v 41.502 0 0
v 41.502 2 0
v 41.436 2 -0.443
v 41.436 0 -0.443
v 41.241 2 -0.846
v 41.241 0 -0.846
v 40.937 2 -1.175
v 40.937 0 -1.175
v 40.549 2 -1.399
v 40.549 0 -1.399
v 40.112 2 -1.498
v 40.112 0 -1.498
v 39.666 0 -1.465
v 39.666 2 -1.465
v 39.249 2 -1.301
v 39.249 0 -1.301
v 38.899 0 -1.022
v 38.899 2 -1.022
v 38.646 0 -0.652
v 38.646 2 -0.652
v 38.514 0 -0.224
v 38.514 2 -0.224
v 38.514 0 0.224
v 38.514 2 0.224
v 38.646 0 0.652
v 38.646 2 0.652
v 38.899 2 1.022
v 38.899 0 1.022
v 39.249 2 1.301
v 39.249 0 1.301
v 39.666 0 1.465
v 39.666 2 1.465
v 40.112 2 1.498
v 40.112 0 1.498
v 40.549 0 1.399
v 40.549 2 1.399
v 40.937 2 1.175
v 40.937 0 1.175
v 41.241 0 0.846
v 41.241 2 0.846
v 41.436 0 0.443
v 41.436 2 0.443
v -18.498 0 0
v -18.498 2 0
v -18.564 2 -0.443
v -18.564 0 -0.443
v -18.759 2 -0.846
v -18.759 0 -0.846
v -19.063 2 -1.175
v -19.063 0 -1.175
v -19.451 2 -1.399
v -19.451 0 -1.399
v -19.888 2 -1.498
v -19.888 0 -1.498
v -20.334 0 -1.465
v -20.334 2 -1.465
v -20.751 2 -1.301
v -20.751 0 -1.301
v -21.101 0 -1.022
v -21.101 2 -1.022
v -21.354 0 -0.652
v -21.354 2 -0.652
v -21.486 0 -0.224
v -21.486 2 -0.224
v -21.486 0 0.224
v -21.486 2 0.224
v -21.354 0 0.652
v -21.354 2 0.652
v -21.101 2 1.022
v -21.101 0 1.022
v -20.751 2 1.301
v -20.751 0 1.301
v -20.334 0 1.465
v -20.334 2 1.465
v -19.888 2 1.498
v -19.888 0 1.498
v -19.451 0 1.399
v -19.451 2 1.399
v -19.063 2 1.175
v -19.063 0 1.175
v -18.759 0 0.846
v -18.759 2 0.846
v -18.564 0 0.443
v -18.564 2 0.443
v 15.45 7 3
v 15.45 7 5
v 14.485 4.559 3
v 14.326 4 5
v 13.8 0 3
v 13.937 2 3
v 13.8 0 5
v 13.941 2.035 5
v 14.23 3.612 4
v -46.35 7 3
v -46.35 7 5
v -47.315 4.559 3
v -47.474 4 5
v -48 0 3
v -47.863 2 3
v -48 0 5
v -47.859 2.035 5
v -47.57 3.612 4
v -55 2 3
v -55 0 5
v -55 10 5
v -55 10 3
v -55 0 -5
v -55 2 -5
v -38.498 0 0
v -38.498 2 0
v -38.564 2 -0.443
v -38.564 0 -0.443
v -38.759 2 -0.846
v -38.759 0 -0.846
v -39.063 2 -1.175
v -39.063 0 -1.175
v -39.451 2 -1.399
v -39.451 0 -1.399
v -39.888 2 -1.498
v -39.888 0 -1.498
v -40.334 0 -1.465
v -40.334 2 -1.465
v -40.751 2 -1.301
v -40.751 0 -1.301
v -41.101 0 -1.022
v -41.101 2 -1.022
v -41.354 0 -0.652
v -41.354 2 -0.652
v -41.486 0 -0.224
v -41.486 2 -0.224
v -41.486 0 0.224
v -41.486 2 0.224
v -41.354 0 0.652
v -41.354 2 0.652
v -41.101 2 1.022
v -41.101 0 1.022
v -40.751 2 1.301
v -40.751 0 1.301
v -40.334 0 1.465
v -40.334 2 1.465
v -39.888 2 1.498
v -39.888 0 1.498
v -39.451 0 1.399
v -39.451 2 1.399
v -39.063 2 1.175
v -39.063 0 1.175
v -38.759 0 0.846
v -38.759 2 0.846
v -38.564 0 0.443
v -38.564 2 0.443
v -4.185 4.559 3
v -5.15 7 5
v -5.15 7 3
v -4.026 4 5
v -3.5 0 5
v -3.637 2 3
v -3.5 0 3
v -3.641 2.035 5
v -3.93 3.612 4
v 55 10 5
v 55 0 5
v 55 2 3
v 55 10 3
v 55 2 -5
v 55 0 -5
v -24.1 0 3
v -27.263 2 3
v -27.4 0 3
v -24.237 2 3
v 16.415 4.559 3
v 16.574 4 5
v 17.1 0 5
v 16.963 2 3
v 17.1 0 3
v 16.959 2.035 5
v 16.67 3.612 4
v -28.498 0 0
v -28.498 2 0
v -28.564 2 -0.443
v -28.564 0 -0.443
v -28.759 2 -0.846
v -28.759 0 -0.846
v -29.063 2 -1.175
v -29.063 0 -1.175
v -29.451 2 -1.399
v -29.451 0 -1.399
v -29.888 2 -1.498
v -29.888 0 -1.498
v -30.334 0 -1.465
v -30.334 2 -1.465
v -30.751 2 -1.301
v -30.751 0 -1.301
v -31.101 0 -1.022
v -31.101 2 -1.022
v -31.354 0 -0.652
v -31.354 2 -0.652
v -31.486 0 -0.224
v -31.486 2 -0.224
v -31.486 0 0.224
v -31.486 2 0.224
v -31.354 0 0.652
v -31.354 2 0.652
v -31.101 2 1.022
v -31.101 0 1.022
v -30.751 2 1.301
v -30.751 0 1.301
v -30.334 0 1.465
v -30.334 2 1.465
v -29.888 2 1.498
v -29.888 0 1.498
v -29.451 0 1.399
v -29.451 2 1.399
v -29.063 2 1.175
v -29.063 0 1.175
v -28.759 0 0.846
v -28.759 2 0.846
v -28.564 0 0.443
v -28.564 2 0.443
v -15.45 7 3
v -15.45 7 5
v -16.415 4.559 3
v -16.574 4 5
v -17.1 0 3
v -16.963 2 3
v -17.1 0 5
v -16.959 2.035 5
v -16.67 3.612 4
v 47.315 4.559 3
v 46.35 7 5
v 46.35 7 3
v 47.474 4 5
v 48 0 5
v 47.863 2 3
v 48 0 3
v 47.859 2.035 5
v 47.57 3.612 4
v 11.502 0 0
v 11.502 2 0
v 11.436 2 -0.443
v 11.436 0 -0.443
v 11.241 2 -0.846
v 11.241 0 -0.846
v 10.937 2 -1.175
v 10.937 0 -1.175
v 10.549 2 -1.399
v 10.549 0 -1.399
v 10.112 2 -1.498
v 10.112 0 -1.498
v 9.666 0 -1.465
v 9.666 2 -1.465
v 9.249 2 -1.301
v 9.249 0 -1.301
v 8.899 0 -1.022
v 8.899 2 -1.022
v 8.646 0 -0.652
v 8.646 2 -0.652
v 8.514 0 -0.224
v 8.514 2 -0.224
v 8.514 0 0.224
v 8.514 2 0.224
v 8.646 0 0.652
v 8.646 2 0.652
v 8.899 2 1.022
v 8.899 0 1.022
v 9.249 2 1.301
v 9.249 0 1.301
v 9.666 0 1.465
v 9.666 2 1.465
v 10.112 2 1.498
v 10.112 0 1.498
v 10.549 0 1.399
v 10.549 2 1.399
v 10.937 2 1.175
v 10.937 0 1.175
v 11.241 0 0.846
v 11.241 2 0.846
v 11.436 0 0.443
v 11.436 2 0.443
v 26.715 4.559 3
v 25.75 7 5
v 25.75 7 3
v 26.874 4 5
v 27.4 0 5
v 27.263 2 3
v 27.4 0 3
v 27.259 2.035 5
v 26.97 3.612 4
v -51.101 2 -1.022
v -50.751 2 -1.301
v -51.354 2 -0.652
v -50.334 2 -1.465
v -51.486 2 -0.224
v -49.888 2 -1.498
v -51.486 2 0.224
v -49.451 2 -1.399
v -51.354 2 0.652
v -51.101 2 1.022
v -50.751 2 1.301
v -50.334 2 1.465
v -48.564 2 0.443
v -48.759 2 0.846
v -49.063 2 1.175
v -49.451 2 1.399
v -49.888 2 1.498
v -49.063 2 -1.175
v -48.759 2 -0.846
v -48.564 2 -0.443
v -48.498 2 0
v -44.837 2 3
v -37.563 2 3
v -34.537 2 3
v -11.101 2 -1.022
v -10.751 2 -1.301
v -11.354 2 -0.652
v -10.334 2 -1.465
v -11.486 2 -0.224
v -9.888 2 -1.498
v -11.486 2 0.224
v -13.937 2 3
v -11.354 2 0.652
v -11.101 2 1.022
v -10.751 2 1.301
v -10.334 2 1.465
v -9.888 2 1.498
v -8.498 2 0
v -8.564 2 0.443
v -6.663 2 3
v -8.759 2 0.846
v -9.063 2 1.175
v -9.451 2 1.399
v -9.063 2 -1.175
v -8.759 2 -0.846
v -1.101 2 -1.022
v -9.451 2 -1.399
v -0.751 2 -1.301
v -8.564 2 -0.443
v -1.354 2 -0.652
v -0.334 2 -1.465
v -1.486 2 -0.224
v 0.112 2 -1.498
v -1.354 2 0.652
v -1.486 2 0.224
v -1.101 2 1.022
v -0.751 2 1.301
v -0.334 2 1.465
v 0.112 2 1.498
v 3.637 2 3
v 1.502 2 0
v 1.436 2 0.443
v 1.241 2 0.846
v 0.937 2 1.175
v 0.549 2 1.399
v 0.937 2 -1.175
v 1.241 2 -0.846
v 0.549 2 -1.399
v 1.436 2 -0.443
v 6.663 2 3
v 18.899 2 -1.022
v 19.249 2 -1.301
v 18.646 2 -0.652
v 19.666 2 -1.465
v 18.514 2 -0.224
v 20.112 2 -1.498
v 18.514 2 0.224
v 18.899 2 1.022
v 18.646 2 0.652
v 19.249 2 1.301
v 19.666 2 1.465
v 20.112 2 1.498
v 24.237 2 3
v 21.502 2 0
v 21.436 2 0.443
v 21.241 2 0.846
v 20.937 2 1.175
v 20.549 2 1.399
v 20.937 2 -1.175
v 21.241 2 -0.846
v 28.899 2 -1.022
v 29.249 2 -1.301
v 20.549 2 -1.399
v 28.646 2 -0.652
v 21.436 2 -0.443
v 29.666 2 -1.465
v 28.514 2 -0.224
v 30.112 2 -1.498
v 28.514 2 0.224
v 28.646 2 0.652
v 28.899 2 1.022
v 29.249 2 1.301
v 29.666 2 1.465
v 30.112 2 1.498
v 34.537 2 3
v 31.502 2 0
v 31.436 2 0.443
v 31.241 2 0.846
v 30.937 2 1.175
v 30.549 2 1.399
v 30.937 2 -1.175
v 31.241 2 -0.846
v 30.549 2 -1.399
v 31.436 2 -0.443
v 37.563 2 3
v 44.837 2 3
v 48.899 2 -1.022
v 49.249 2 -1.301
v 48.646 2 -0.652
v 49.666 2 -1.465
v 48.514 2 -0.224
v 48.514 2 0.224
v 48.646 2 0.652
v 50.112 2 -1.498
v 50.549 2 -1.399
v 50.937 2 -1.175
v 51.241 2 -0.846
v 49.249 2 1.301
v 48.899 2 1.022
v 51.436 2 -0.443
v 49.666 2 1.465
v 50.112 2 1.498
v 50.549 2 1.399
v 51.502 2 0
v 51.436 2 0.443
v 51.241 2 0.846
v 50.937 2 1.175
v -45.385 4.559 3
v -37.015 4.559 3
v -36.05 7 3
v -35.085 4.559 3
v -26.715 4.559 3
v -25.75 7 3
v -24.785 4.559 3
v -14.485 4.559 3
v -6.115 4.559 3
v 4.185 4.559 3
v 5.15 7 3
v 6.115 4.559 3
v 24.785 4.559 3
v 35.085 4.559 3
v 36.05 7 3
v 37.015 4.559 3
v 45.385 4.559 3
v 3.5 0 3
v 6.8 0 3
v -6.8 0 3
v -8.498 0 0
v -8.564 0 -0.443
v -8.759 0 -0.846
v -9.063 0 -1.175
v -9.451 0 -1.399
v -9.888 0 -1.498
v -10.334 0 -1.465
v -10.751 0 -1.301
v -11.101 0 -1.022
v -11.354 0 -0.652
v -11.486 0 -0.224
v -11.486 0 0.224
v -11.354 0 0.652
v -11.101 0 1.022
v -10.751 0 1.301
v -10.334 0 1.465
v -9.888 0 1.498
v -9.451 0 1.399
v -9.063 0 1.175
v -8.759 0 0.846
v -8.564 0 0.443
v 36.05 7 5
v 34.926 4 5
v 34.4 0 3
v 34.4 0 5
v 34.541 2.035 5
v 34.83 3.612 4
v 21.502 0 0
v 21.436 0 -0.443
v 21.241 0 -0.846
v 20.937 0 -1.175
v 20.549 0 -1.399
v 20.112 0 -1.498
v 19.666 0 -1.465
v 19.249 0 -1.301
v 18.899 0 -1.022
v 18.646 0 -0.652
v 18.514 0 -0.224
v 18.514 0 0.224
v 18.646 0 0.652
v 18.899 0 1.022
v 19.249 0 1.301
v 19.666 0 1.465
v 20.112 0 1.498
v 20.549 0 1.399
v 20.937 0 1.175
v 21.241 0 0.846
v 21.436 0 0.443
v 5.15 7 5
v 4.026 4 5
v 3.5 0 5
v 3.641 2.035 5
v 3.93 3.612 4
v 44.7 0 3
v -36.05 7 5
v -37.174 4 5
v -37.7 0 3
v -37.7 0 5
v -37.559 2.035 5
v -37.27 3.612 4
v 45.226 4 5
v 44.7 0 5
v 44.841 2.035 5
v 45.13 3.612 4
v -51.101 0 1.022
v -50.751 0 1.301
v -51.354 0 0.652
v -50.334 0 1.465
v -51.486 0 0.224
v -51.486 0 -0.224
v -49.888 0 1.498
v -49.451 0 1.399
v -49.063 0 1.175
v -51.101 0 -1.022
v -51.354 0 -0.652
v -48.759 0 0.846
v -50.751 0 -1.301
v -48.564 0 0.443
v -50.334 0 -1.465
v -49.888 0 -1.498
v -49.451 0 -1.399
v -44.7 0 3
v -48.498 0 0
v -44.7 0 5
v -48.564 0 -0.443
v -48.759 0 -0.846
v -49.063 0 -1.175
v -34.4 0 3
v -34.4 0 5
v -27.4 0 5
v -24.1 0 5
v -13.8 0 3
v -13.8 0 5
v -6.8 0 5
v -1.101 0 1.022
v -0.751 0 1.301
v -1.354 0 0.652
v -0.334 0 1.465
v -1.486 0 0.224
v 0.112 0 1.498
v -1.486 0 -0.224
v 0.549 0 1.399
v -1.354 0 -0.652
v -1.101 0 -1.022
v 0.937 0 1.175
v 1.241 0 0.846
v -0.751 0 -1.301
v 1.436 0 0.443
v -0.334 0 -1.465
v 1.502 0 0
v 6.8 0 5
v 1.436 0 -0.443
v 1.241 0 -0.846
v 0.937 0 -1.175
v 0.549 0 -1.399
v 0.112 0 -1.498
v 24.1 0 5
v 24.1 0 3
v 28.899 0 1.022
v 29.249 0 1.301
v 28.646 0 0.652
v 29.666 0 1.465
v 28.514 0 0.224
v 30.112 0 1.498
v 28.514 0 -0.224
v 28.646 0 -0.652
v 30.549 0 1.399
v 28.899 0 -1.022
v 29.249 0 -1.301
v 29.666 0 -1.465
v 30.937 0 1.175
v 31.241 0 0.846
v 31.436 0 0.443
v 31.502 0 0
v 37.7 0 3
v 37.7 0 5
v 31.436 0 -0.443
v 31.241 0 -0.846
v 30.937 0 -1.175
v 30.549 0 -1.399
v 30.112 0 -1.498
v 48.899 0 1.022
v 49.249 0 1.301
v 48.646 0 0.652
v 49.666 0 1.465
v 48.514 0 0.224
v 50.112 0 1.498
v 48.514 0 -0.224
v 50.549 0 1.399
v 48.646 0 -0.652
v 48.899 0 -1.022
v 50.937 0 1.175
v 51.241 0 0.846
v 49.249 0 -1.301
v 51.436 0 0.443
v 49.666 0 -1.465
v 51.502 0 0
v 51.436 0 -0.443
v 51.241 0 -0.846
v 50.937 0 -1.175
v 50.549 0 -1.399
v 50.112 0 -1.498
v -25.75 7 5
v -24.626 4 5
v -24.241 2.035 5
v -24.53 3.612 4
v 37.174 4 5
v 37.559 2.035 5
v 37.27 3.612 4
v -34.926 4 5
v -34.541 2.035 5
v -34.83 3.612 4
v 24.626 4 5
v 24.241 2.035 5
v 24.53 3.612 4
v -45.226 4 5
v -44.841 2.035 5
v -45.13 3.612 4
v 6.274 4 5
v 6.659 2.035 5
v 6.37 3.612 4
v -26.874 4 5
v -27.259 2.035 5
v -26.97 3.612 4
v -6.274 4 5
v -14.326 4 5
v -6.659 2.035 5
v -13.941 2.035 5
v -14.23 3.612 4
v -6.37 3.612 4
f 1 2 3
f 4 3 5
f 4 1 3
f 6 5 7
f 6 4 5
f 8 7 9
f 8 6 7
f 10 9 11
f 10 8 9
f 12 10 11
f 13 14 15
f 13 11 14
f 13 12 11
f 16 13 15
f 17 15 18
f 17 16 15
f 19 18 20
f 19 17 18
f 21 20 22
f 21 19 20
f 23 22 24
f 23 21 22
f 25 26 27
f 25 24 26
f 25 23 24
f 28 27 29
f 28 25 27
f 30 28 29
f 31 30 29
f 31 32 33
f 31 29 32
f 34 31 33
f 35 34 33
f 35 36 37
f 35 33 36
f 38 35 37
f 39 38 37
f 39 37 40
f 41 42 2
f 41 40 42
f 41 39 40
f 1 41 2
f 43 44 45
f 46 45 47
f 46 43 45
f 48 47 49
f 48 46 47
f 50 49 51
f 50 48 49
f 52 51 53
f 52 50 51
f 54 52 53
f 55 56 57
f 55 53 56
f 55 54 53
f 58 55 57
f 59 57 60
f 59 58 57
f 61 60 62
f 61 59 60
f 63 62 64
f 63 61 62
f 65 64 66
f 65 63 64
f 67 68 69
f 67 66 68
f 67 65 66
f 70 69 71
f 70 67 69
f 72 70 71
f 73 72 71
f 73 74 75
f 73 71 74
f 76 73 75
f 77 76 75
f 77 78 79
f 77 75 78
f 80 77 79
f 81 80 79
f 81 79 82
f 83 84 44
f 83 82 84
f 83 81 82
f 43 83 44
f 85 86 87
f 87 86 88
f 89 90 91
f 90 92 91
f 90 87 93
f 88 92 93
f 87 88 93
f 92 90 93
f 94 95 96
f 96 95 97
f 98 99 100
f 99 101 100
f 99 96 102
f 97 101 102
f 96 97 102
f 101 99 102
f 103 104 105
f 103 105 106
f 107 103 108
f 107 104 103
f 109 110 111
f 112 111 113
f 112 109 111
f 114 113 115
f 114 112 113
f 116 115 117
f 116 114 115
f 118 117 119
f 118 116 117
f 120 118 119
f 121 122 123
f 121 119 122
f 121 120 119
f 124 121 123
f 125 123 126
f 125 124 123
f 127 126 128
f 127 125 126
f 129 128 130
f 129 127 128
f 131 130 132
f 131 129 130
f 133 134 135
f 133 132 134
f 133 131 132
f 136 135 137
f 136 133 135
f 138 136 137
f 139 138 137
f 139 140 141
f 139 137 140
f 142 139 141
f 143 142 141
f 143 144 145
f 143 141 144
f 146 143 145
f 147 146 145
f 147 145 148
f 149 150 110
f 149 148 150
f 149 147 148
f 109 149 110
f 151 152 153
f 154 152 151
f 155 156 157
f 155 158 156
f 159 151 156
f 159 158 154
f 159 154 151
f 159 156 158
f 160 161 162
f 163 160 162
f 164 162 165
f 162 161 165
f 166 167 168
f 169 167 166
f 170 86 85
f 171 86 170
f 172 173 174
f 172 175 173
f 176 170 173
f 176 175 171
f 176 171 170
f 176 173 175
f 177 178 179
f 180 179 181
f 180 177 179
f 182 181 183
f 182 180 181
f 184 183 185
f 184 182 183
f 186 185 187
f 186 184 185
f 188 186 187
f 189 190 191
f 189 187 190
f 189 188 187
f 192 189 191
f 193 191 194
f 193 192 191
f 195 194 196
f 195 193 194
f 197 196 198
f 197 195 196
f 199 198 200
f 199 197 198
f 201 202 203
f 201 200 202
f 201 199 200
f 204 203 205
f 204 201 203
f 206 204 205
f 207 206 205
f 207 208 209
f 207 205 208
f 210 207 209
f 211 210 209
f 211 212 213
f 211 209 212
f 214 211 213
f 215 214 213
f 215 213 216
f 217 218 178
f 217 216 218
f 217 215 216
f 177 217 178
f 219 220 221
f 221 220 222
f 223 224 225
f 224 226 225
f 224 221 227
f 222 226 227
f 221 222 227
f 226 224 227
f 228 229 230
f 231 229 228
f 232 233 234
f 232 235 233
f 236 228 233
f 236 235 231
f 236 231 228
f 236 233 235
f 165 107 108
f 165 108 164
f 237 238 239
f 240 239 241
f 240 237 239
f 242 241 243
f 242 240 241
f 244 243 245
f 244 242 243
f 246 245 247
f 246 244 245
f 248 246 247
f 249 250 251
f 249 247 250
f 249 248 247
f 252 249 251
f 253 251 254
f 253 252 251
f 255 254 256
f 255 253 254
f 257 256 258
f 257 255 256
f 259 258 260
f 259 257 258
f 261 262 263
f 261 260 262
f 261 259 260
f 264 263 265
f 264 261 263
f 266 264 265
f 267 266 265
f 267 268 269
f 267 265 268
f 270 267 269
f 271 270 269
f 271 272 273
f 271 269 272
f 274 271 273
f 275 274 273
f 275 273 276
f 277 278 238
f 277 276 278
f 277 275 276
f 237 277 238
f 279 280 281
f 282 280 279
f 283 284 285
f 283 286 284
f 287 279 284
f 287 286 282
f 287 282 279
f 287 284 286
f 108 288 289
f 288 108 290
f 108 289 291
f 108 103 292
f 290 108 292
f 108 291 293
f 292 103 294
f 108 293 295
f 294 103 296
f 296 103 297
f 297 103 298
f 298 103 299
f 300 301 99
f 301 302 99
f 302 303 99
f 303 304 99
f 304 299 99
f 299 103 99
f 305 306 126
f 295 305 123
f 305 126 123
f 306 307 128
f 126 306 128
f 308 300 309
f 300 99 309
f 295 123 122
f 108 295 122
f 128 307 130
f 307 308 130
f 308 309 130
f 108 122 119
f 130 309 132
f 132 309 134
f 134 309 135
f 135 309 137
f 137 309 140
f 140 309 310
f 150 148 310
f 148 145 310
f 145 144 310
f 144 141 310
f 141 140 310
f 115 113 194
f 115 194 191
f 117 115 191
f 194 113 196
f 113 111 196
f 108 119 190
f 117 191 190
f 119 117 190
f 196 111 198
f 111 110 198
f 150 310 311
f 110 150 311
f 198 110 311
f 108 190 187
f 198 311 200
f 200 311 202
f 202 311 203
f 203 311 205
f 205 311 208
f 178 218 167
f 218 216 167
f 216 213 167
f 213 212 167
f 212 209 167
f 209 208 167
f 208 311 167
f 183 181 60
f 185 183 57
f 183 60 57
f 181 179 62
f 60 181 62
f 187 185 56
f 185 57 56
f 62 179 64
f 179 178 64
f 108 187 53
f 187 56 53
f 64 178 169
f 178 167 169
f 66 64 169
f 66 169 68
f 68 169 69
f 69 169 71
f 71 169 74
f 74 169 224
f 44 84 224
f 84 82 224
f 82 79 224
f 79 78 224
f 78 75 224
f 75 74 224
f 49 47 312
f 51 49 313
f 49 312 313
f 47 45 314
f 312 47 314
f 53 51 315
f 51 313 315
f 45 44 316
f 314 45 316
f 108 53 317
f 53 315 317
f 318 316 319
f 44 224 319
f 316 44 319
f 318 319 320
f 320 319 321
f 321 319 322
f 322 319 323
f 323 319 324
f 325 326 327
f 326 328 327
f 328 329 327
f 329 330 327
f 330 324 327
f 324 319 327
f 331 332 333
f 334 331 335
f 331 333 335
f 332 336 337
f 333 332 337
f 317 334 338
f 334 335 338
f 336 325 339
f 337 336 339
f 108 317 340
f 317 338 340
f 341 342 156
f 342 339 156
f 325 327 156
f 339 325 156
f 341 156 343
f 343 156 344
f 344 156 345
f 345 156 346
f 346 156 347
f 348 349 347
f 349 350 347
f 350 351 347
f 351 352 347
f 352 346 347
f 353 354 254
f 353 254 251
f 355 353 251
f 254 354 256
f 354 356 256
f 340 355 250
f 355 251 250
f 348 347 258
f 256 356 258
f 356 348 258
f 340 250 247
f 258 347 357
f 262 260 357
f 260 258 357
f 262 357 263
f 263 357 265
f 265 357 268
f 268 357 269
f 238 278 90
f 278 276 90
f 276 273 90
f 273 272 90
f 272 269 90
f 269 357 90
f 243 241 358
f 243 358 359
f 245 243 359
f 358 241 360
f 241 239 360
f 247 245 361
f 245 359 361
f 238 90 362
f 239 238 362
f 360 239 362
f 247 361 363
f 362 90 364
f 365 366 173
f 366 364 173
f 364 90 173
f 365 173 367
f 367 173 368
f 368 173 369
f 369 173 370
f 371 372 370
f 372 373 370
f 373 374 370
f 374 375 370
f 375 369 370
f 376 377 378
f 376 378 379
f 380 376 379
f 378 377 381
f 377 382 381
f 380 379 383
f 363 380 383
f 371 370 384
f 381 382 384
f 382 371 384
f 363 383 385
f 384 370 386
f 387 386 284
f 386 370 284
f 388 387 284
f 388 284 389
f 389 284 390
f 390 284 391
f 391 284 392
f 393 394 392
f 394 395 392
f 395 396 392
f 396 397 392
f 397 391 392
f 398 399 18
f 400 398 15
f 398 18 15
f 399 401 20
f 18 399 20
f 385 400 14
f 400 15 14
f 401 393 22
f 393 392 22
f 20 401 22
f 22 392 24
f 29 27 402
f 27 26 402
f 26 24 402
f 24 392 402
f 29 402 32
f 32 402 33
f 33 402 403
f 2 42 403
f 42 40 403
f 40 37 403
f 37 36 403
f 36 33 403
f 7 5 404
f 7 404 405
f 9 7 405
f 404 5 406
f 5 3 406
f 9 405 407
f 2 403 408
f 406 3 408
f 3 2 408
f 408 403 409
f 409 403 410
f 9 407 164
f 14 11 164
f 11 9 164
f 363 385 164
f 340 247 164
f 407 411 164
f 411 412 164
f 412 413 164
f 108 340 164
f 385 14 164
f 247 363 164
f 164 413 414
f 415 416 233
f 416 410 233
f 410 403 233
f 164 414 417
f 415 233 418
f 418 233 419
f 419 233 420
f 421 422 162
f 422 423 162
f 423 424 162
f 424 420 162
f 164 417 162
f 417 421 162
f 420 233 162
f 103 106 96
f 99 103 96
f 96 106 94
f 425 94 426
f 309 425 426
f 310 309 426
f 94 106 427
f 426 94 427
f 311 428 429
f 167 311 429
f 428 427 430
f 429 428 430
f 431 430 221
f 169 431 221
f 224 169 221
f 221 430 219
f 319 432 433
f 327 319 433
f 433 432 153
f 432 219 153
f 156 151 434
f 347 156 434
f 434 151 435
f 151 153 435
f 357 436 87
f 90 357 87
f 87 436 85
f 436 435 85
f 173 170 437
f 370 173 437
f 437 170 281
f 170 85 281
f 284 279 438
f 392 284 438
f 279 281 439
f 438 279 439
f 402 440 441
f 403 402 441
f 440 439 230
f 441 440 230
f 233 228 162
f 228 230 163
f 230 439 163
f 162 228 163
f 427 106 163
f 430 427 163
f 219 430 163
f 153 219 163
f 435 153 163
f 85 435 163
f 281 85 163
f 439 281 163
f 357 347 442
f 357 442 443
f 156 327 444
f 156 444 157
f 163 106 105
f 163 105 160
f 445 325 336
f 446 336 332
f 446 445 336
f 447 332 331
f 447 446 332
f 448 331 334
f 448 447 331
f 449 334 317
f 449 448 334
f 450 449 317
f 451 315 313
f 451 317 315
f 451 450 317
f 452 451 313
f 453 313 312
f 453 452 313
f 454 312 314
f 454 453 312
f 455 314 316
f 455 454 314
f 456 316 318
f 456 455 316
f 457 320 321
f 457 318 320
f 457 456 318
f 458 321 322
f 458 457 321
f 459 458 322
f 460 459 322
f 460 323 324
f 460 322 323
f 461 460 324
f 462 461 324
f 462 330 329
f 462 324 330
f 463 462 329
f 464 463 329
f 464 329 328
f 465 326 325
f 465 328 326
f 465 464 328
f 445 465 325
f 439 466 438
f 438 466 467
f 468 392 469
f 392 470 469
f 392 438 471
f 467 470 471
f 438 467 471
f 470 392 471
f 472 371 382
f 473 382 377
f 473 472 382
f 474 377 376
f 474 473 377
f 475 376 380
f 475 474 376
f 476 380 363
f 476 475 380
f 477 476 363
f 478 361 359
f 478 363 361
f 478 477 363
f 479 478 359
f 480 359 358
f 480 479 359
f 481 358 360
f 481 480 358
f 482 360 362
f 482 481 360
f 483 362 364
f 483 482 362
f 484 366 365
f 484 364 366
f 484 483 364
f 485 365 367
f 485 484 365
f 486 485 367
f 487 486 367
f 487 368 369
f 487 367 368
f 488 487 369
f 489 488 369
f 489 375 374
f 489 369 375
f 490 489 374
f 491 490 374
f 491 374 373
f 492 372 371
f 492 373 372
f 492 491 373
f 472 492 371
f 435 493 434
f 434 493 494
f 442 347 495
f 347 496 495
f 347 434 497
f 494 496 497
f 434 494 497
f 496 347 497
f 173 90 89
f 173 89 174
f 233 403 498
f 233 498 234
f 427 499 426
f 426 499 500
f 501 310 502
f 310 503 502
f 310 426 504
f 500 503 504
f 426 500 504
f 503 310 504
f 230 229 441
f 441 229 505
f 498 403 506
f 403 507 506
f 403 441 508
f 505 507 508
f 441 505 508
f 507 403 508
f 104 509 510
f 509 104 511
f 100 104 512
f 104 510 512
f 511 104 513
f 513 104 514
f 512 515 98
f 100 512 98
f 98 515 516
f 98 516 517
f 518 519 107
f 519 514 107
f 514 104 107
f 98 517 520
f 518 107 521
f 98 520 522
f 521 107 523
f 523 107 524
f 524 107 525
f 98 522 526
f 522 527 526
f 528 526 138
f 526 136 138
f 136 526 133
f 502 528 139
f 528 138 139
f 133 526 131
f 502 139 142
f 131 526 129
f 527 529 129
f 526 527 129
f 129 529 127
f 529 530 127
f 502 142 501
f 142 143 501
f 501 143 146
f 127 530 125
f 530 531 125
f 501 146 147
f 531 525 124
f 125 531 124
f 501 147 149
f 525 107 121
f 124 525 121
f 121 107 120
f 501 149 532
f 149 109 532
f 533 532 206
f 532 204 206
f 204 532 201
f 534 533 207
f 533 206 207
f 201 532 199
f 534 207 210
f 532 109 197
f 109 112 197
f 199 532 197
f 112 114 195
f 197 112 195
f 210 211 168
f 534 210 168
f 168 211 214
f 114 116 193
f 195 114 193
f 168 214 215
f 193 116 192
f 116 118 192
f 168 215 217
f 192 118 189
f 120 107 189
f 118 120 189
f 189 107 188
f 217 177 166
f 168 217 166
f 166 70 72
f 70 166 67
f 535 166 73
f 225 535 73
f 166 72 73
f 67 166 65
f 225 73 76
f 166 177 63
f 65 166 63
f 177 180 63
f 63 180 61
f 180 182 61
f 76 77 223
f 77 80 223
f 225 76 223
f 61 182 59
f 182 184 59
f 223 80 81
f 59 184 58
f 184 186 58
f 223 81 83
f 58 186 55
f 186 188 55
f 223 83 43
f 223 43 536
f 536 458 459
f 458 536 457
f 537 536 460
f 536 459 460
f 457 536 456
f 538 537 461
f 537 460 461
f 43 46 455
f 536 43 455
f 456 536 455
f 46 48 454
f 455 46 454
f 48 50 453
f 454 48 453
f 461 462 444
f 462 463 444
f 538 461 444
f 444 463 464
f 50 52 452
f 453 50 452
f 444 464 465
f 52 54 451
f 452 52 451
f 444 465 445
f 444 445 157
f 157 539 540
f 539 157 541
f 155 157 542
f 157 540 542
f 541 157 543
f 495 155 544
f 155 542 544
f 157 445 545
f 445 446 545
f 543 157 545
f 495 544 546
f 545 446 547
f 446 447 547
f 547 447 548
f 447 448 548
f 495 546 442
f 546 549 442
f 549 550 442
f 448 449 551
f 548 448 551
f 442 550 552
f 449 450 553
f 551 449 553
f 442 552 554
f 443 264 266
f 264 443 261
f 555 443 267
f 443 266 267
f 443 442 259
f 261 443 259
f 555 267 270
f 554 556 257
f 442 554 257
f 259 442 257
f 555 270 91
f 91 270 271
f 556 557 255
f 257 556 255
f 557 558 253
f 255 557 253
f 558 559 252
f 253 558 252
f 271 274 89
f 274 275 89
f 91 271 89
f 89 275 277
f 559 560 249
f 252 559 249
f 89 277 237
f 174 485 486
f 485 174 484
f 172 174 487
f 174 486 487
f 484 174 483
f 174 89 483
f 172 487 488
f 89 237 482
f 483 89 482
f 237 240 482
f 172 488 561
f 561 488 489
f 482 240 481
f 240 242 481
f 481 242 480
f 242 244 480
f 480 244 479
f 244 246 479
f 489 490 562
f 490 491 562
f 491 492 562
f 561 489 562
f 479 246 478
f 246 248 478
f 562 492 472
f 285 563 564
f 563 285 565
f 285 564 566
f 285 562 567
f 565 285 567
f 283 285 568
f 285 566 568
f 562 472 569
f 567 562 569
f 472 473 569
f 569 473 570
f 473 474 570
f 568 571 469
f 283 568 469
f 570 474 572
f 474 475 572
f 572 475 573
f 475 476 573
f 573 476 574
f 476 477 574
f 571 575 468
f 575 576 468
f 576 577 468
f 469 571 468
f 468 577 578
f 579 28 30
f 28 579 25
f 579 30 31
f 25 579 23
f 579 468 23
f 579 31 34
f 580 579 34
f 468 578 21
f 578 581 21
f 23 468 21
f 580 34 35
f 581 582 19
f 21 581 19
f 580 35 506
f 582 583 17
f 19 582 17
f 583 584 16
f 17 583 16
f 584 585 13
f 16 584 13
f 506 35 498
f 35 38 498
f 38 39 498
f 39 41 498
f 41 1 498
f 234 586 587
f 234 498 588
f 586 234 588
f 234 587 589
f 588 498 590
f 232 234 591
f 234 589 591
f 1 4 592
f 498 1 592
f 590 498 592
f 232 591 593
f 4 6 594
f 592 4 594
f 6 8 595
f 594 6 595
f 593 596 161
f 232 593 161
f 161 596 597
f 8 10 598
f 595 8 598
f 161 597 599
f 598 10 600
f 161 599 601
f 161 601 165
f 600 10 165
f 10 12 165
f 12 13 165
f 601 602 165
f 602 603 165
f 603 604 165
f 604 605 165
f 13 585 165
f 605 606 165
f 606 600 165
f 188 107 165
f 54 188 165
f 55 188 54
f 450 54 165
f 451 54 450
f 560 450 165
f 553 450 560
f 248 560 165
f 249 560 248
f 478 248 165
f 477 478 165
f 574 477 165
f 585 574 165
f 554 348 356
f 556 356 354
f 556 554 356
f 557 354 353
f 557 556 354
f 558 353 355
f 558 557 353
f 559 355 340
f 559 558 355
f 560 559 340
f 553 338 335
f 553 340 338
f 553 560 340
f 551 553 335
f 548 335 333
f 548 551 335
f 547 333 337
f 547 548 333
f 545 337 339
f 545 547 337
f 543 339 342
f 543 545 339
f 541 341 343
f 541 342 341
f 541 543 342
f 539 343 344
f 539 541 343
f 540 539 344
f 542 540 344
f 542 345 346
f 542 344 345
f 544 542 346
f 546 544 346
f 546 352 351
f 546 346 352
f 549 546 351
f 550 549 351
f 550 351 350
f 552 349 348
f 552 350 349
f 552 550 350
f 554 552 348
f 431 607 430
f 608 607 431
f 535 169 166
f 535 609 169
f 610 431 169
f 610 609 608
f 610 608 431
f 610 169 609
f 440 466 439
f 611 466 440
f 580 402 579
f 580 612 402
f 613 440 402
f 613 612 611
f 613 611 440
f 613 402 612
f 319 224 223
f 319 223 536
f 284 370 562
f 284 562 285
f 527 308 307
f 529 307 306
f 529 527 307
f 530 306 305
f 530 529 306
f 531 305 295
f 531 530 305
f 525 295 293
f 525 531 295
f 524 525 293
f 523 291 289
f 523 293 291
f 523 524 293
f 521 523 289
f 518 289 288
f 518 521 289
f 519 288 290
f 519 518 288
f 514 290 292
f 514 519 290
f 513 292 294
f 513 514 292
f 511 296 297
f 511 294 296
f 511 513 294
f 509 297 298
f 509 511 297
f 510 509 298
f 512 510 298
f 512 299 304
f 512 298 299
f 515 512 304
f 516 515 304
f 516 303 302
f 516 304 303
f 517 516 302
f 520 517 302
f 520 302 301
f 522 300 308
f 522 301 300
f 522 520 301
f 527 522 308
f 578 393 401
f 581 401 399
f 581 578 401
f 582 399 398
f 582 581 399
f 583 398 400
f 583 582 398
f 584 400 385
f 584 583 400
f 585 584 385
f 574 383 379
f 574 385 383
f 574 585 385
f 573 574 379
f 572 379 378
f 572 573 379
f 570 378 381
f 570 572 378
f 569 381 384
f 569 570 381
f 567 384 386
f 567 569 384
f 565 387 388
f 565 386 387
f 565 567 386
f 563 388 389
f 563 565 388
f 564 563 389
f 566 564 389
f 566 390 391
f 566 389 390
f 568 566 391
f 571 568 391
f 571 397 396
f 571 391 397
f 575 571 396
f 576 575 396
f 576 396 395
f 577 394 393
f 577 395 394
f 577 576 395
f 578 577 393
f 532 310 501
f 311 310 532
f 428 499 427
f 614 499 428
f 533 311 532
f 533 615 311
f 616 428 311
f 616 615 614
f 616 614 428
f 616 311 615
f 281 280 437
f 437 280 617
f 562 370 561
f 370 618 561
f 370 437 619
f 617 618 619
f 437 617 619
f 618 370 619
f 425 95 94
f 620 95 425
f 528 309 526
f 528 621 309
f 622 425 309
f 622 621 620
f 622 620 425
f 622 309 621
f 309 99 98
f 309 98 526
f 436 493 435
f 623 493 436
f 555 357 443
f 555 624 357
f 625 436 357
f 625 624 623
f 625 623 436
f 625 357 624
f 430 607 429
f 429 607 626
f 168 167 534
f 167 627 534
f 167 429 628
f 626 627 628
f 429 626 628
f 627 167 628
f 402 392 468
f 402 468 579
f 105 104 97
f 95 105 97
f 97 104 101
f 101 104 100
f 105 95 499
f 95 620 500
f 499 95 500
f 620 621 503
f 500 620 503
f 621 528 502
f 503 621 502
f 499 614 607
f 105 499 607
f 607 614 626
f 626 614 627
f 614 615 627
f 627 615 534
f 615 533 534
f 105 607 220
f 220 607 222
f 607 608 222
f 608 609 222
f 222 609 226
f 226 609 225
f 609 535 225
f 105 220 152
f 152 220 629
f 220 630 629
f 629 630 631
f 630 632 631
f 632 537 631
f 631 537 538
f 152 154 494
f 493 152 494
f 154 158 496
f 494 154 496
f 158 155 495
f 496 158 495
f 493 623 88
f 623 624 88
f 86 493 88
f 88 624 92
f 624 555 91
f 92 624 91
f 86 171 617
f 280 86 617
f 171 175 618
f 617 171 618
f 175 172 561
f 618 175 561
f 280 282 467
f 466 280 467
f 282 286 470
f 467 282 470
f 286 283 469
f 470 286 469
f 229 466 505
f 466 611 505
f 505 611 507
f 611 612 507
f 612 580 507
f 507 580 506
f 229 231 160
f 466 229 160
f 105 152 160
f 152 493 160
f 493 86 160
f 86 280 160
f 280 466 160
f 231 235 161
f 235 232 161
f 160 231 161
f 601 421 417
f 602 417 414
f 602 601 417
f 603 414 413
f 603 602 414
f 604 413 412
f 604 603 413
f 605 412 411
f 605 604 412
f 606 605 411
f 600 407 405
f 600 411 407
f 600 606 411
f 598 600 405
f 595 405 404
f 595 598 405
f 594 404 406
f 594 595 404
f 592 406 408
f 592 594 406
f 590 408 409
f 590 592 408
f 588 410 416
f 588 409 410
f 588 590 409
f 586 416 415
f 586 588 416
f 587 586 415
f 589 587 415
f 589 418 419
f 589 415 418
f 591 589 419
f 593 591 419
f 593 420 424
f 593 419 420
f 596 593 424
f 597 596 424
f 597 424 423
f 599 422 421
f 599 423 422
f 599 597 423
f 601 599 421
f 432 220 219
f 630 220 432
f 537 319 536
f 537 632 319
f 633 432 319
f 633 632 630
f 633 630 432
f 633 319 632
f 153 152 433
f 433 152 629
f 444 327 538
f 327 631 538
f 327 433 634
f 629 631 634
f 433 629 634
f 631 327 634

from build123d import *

# Parameters (mm, degrees)
SKETCH1_W                      = 110
SKETCH1_H                      = 10
SKETCH1_R                      = 1.5025
BOSS_EXTRUDE1_DEPTH            = 10
CUT_EXTRUDE1_REACH             = 7
SKETCH2_W                      = 110
SKETCH2_H                      = 8
CUT_EXTRUDE1_DIRECTION_2_DEPTH = 3
CUT_EXTRUDE2_DEPTH             = 2


with BuildPart() as part:
    # Sketch1 → Boss-Extrude1 (new body)
    with BuildSketch(Plane(origin=(0, 0, 0), x_dir=(1, 0, 0), z_dir=(0, 1, 0))):
        Rectangle(SKETCH1_W, SKETCH1_H)
        with Locations((-50, 0)):
            Circle(SKETCH1_R, mode=Mode.SUBTRACT)
        with Locations((-40, 0)):
            Circle(SKETCH1_R, mode=Mode.SUBTRACT)
        with Locations((-30, 0)):
            Circle(SKETCH1_R, mode=Mode.SUBTRACT)
        with Locations((-20, 0)):
            Circle(SKETCH1_R, mode=Mode.SUBTRACT)
        with Locations((-10, 0)):
            Circle(SKETCH1_R, mode=Mode.SUBTRACT)
        Circle(SKETCH1_R, mode=Mode.SUBTRACT)
        with Locations((10, 0)):
            Circle(SKETCH1_R, mode=Mode.SUBTRACT)
        with Locations((20, 0)):
            Circle(SKETCH1_R, mode=Mode.SUBTRACT)
        with Locations((30, 0)):
            Circle(SKETCH1_R, mode=Mode.SUBTRACT)
        with Locations((40, 0)):
            Circle(SKETCH1_R, mode=Mode.SUBTRACT)
        with Locations((50, 0)):
            Circle(SKETCH1_R, mode=Mode.SUBTRACT)
    extrude(amount=BOSS_EXTRUDE1_DEPTH)

    # Sketch2 → Cut-Extrude1 (cut, up to next)
    with BuildSketch(Plane.XY, mode=Mode.PRIVATE) as cut_extrude1_sk1:
        with Locations((0, 6)):
            Rectangle(SKETCH2_W, SKETCH2_H)
    cut_extrude1_tool1 = extrude(cut_extrude1_sk1.sketch, amount=-CUT_EXTRUDE1_REACH, mode=Mode.PRIVATE) & part.part
    add(cut_extrude1_tool1.solids().sort_by_distance((0, 6, 0))[0], mode=Mode.SUBTRACT)

    # Sketch2 → Cut-Extrude1 direction 2 (cut)
    with BuildSketch(Plane.XY):
        with Locations((0, 6)):
            Rectangle(SKETCH2_W, SKETCH2_H)
    extrude(amount=CUT_EXTRUDE1_DIRECTION_2_DEPTH, mode=Mode.SUBTRACT)

    # Sketch3 → Cut-Extrude2 (cut)
    with BuildSketch(Plane.XY.offset(5)):
        with BuildLine():
            Line((-37.7, 0), (-34.4, 0))
            add(Edge.make_bspline(
                [(-36.05, 7), (-34.434888234, 3.724961413), (-34.4, 0)],
                knots=[0, 0, 0, 1, 1, 1], degree=2))
            add(Edge.make_bspline(
                [(-36.05, 7), (-37.665111766, 3.724961413), (-37.7, 0)],
                knots=[0, 0, 0, 1, 1, 1], degree=2))
        make_face()
        with BuildLine():
            Line((-48, 0), (-44.7, 0))
            add(Edge.make_bspline(
                [(-46.35, 7), (-44.734888234, 3.724961413), (-44.7, 0)],
                knots=[0, 0, 0, 1, 1, 1], degree=2))
            add(Edge.make_bspline(
                [(-46.35, 7), (-47.965111766, 3.724961413), (-48, 0)],
                knots=[0, 0, 0, 1, 1, 1], degree=2))
        make_face()
        with BuildLine():
            Line((-27.4, 0), (-24.1, 0))
            add(Edge.make_bspline(
                [(-25.75, 7), (-24.134888234, 3.724961413), (-24.1, 0)],
                knots=[0, 0, 0, 1, 1, 1], degree=2))
            add(Edge.make_bspline(
                [(-25.75, 7), (-27.365111766, 3.724961413), (-27.4, 0)],
                knots=[0, 0, 0, 1, 1, 1], degree=2))
        make_face()
        with BuildLine():
            Line((-17.1, 0), (-13.8, 0))
            add(Edge.make_bspline(
                [(-15.45, 7), (-13.834888234, 3.724961413), (-13.8, 0)],
                knots=[0, 0, 0, 1, 1, 1], degree=2))
            add(Edge.make_bspline(
                [(-15.45, 7), (-17.065111766, 3.724961413), (-17.1, 0)],
                knots=[0, 0, 0, 1, 1, 1], degree=2))
        make_face()
        with BuildLine():
            Line((-6.8, 0), (-3.5, 0))
            add(Edge.make_bspline(
                [(-5.15, 7), (-3.534888234, 3.724961413), (-3.5, 0)],
                knots=[0, 0, 0, 1, 1, 1], degree=2))
            add(Edge.make_bspline(
                [(-5.15, 7), (-6.765111766, 3.724961413), (-6.8, 0)],
                knots=[0, 0, 0, 1, 1, 1], degree=2))
        make_face()
        with BuildLine():
            Line((3.5, 0), (6.8, 0))
            add(Edge.make_bspline(
                [(5.15, 7), (6.765111766, 3.724961413), (6.8, 0)],
                knots=[0, 0, 0, 1, 1, 1], degree=2))
            add(Edge.make_bspline(
                [(5.15, 7), (3.534888234, 3.724961413), (3.5, 0)],
                knots=[0, 0, 0, 1, 1, 1], degree=2))
        make_face()
        with BuildLine():
            Line((13.8, 0), (17.1, 0))
            add(Edge.make_bspline(
                [(15.45, 7), (17.065111766, 3.724961413), (17.1, 0)],
                knots=[0, 0, 0, 1, 1, 1], degree=2))
            add(Edge.make_bspline(
                [(15.45, 7), (13.834888234, 3.724961413), (13.8, 0)],
                knots=[0, 0, 0, 1, 1, 1], degree=2))
        make_face()
        with BuildLine():
            Line((24.1, 0), (27.4, 0))
            add(Edge.make_bspline(
                [(25.75, 7), (27.365111766, 3.724961413), (27.4, 0)],
                knots=[0, 0, 0, 1, 1, 1], degree=2))
            add(Edge.make_bspline(
                [(25.75, 7), (24.134888234, 3.724961413), (24.1, 0)],
                knots=[0, 0, 0, 1, 1, 1], degree=2))
        make_face()
        with BuildLine():
            Line((34.4, 0), (37.7, 0))
            add(Edge.make_bspline(
                [(36.05, 7), (37.665111766, 3.724961413), (37.7, 0)],
                knots=[0, 0, 0, 1, 1, 1], degree=2))
            add(Edge.make_bspline(
                [(36.05, 7), (34.434888234, 3.724961413), (34.4, 0)],
                knots=[0, 0, 0, 1, 1, 1], degree=2))
        make_face()
        with BuildLine():
            Line((44.7, 0), (48, 0))
            add(Edge.make_bspline(
                [(46.35, 7), (47.965111766, 3.724961413), (48, 0)],
                knots=[0, 0, 0, 1, 1, 1], degree=2))
            add(Edge.make_bspline(
                [(46.35, 7), (44.734888234, 3.724961413), (44.7, 0)],
                knots=[0, 0, 0, 1, 1, 1], degree=2))
        make_face()
    extrude(amount=-CUT_EXTRUDE2_DEPTH, mode=Mode.SUBTRACT)


solid = part.part
